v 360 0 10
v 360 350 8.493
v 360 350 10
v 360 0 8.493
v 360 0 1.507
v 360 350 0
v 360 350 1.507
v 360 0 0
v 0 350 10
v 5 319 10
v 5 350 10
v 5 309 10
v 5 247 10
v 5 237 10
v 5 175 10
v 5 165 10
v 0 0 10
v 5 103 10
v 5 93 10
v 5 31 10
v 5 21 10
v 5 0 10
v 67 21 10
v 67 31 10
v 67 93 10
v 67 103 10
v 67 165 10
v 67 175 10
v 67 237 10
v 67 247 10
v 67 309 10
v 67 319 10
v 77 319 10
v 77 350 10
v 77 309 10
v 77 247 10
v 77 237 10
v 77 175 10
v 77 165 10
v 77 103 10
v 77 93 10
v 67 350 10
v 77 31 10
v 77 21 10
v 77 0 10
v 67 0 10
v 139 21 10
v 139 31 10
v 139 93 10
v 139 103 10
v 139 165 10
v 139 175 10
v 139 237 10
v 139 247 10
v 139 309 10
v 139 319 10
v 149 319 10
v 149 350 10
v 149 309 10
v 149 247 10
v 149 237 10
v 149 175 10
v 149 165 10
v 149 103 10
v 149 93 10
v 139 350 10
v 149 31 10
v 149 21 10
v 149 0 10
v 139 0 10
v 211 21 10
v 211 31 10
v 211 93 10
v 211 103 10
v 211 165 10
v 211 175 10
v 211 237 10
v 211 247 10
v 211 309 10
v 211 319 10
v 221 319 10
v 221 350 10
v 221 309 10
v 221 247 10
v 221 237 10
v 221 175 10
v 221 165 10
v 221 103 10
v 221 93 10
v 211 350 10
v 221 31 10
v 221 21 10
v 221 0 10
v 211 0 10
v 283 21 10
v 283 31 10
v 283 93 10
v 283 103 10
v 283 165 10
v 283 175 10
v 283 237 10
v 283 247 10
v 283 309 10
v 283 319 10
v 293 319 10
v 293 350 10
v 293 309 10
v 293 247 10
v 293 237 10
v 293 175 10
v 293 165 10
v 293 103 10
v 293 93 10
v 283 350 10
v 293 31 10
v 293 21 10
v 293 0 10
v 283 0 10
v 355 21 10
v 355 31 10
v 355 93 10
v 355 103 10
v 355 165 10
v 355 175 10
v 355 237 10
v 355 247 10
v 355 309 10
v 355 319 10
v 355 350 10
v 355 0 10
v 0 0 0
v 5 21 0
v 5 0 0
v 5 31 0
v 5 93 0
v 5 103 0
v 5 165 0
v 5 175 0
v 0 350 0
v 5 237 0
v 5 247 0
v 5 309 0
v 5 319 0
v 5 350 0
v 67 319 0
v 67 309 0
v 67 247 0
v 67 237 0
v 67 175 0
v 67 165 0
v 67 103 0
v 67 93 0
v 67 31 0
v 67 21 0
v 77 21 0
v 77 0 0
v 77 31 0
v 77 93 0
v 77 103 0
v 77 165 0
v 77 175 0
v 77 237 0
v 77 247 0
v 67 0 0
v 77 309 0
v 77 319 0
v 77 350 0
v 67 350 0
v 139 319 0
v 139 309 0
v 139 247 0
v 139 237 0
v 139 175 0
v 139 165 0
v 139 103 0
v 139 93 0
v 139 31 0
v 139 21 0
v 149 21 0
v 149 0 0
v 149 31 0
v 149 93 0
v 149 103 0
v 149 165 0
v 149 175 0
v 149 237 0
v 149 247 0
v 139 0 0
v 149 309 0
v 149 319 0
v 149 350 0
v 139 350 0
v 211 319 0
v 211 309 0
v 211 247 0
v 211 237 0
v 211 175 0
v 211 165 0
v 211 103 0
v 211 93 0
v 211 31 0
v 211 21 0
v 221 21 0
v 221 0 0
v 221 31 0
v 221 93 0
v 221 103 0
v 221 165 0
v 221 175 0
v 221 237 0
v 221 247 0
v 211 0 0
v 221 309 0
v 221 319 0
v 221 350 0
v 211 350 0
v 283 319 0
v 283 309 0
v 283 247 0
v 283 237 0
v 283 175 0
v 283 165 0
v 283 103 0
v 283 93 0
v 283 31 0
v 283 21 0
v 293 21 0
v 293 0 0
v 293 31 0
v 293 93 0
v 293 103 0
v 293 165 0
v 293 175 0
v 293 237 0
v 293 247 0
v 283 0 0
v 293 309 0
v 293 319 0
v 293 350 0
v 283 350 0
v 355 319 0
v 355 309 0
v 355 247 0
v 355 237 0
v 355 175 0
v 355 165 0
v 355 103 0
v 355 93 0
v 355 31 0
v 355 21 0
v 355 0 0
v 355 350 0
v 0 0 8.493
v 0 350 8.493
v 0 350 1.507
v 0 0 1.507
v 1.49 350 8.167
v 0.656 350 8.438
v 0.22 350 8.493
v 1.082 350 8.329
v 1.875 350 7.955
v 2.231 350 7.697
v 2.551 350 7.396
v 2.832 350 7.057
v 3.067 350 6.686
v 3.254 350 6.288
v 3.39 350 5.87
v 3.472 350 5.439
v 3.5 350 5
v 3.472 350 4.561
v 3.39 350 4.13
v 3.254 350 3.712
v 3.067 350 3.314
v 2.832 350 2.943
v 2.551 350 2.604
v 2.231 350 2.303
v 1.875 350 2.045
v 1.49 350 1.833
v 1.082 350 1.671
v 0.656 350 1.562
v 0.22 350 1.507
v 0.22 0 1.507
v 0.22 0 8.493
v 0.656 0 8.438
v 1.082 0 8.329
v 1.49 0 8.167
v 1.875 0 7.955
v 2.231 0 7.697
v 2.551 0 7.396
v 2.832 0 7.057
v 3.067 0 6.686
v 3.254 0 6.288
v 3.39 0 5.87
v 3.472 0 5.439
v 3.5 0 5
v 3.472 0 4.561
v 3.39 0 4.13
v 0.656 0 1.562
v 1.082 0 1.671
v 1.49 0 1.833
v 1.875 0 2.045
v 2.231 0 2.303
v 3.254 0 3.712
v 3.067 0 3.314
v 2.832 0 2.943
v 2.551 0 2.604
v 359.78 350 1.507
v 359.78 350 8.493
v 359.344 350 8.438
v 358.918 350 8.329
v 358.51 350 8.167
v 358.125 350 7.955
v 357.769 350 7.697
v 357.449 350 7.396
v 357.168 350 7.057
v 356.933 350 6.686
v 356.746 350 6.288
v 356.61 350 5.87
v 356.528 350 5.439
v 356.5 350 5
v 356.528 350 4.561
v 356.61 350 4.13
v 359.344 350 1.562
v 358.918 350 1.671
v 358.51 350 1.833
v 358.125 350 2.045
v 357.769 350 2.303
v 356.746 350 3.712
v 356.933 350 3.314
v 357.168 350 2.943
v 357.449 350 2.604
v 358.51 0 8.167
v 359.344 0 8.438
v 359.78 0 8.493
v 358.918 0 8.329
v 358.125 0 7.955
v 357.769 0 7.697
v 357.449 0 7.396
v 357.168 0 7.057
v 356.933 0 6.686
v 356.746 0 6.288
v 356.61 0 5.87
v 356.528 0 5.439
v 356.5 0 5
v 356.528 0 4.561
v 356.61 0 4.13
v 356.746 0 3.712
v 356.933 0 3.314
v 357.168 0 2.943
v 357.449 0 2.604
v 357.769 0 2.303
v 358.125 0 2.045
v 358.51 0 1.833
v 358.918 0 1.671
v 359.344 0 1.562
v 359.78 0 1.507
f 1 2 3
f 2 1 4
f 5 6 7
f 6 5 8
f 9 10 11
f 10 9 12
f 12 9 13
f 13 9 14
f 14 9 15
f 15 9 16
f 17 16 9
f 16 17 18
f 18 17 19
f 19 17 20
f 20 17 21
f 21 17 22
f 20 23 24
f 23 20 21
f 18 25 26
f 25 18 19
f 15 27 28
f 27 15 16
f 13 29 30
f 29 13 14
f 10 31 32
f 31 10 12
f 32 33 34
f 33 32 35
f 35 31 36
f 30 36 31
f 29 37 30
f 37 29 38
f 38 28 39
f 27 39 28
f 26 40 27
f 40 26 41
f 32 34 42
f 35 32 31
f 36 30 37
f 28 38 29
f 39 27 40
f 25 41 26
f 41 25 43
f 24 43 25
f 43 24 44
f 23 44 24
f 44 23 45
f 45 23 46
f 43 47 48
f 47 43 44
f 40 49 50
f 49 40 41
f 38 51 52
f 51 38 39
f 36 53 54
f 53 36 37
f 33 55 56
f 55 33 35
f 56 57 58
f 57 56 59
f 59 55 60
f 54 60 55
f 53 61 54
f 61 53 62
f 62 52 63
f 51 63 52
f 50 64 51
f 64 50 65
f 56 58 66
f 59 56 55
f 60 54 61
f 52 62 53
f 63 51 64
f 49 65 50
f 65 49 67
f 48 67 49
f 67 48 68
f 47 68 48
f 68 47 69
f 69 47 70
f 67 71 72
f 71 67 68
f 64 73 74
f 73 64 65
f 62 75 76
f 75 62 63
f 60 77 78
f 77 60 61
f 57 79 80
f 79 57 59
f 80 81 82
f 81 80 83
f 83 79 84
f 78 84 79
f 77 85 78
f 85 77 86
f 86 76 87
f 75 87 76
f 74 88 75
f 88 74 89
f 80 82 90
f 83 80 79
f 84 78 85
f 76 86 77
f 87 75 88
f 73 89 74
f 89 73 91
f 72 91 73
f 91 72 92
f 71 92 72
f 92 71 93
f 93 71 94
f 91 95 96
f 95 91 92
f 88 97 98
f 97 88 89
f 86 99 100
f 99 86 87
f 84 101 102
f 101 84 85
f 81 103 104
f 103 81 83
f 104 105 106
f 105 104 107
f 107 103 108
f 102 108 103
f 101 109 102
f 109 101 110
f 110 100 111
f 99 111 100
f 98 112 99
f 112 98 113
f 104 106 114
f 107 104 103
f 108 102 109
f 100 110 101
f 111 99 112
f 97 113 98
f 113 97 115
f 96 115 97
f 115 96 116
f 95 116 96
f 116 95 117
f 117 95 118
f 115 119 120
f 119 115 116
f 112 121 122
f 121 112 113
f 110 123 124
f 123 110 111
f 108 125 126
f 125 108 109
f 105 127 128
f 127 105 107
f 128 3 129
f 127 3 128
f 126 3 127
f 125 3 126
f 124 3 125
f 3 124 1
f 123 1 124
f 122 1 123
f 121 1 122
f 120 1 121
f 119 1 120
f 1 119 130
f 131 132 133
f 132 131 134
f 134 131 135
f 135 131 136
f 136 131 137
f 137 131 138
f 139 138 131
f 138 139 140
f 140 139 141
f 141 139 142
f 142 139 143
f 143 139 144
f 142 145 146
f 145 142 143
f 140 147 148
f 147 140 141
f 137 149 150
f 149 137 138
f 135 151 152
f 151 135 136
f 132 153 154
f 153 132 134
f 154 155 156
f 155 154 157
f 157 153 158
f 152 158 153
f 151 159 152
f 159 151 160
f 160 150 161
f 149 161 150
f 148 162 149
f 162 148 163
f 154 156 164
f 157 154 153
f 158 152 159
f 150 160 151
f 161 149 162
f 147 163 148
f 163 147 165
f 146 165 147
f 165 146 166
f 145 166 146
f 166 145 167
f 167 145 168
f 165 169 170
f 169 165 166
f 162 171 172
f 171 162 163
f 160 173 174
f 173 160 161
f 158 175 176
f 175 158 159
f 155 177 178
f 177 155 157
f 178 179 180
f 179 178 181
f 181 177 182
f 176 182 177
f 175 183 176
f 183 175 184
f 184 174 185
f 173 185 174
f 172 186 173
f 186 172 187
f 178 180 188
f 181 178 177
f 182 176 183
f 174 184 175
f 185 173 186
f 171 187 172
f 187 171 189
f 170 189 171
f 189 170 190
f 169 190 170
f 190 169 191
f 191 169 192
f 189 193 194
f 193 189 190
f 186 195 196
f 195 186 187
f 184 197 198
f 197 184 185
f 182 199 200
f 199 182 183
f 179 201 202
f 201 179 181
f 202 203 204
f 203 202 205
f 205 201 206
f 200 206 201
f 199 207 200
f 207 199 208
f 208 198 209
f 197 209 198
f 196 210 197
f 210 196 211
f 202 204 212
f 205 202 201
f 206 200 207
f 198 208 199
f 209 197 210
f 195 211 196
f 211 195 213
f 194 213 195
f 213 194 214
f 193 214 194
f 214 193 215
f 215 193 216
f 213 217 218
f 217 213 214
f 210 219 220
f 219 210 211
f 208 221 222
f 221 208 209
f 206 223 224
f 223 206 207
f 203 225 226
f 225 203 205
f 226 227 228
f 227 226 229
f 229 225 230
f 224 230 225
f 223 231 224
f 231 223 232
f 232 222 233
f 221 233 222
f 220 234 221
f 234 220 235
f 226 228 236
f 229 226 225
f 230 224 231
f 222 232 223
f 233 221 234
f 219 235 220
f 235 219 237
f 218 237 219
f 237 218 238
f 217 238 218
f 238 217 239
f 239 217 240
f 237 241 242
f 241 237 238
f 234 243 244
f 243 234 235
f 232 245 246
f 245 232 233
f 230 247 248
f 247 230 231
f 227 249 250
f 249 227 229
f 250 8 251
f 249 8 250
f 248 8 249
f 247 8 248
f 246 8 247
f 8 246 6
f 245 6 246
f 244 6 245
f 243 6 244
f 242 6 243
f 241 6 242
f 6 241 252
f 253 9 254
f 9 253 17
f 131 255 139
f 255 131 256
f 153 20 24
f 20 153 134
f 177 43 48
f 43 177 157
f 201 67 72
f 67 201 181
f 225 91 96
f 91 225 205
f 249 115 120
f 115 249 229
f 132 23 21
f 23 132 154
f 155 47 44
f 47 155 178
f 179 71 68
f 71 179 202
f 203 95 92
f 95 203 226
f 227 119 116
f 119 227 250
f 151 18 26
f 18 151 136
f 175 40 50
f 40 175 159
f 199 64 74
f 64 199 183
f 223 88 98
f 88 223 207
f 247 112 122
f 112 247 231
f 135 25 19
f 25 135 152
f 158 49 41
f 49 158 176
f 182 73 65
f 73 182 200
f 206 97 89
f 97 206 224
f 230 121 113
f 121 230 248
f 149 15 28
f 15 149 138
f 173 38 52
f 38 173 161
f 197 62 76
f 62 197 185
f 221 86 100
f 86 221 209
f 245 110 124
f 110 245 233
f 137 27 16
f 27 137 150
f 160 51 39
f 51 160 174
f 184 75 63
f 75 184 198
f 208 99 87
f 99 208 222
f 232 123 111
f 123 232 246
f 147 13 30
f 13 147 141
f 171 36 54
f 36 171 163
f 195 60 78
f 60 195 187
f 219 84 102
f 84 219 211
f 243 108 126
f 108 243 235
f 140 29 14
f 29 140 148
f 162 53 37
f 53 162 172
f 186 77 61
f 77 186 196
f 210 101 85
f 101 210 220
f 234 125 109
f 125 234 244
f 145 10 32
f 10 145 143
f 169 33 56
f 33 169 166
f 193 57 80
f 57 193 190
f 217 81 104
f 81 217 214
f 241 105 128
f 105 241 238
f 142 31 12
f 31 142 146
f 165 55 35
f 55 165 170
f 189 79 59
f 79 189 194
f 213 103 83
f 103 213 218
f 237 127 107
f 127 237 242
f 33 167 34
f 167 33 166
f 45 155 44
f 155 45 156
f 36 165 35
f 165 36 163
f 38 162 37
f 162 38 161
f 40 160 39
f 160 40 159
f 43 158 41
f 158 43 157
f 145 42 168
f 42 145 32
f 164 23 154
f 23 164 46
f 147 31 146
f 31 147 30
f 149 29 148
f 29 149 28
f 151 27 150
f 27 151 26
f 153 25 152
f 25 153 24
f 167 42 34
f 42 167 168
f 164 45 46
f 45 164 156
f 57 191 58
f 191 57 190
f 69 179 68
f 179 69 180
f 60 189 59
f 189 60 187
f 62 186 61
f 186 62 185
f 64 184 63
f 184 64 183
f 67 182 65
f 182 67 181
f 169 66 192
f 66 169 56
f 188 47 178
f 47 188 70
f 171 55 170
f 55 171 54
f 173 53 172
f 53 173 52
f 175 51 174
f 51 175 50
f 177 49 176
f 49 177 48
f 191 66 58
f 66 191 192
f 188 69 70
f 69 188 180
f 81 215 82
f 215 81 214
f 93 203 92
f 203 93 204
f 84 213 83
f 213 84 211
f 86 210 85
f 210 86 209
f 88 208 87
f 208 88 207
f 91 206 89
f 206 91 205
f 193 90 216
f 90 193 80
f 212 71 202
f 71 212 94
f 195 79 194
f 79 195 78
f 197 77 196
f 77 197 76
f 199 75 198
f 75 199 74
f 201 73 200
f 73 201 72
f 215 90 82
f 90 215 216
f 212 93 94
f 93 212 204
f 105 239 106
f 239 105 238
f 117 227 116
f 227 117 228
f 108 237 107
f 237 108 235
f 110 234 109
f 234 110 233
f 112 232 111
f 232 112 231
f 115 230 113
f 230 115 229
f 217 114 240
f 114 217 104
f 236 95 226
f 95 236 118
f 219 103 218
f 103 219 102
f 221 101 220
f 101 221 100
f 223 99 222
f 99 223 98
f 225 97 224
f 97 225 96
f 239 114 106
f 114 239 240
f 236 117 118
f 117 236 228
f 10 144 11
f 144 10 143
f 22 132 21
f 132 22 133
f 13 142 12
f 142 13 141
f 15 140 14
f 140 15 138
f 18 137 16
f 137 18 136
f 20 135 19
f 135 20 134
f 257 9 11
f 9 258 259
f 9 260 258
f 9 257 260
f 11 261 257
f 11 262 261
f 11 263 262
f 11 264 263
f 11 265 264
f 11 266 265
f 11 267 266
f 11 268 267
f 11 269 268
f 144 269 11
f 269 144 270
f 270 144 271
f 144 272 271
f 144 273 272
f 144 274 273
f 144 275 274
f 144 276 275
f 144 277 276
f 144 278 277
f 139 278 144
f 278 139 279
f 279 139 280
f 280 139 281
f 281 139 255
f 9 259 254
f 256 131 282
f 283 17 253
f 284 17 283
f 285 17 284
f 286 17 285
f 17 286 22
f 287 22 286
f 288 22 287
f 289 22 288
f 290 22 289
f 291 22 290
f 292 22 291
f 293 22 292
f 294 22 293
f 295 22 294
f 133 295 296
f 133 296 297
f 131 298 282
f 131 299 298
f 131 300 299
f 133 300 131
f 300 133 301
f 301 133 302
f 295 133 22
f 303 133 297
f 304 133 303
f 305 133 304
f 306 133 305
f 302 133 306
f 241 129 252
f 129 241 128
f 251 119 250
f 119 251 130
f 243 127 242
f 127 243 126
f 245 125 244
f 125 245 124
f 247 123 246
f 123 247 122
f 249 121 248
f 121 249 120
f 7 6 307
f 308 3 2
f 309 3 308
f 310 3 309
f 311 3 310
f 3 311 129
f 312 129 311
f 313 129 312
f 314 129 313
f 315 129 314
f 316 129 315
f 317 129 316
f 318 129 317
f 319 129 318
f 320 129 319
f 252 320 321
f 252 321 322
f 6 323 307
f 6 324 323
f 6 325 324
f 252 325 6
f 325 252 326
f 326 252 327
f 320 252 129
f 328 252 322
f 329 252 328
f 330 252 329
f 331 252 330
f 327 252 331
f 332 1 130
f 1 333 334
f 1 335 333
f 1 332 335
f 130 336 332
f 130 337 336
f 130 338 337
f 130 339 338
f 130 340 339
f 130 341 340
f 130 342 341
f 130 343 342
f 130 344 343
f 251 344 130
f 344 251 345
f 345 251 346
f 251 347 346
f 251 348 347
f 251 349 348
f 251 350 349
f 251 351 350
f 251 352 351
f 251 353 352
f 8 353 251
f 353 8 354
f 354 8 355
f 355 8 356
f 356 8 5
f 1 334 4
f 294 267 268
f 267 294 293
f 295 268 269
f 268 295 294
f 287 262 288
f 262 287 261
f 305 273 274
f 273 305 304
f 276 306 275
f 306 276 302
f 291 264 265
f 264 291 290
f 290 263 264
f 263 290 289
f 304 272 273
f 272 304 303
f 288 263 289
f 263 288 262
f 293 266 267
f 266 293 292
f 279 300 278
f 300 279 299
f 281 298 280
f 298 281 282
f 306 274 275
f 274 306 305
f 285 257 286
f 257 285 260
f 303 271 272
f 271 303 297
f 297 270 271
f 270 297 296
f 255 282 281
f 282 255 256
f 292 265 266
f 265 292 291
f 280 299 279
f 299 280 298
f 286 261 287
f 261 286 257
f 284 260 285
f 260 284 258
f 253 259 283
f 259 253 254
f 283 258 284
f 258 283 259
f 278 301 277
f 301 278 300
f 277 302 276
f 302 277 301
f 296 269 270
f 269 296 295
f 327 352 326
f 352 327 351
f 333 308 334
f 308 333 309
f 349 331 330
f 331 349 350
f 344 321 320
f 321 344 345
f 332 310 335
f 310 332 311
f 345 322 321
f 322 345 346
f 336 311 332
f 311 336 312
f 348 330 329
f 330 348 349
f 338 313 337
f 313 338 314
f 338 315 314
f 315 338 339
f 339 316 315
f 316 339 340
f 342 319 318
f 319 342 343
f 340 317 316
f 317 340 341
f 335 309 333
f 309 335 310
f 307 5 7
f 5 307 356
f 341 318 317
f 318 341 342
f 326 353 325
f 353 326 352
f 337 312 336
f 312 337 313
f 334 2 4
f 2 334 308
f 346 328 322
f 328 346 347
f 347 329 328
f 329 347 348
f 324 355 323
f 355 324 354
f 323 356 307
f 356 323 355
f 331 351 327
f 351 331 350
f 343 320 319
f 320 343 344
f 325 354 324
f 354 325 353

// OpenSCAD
difference()
{
  union()
  {
    translate([67, 0, 0]) cube([10, 350, 10]);
    translate([139, 0, 0]) cube([10, 350, 10]);
    translate([211, 0, 0]) cube([10, 350, 10]);
    translate([283, 0, 0]) cube([10, 350, 10]);
    h = [26, 98, 170, 242, 314];
    for(c = h)
    {
      translate([0, c -5, 0]) cube([360, 10, 10]);
    }
    translate([0, 0, 0]) cube([5, 350, 10]);
    translate([355, 0, 0]) cube([5, 350, 10]);
  }
  intersection()
  {
    translate([0, 175, 5]) rotate([90, 0, 0]) cylinder(h = 352, r = 3.5, $fn = 50, center = true);
    translate([0, 0, 0]) cube([10, 350, 10]);
  }
  intersection()
  {
    translate([360, 175, 5]) rotate([90, 0, 0]) cylinder(h = 352, r = 3.5, $fn = 50, center = true);
    translate([350, 0, 0]) cube([10, 350, 10]);
  }
}
